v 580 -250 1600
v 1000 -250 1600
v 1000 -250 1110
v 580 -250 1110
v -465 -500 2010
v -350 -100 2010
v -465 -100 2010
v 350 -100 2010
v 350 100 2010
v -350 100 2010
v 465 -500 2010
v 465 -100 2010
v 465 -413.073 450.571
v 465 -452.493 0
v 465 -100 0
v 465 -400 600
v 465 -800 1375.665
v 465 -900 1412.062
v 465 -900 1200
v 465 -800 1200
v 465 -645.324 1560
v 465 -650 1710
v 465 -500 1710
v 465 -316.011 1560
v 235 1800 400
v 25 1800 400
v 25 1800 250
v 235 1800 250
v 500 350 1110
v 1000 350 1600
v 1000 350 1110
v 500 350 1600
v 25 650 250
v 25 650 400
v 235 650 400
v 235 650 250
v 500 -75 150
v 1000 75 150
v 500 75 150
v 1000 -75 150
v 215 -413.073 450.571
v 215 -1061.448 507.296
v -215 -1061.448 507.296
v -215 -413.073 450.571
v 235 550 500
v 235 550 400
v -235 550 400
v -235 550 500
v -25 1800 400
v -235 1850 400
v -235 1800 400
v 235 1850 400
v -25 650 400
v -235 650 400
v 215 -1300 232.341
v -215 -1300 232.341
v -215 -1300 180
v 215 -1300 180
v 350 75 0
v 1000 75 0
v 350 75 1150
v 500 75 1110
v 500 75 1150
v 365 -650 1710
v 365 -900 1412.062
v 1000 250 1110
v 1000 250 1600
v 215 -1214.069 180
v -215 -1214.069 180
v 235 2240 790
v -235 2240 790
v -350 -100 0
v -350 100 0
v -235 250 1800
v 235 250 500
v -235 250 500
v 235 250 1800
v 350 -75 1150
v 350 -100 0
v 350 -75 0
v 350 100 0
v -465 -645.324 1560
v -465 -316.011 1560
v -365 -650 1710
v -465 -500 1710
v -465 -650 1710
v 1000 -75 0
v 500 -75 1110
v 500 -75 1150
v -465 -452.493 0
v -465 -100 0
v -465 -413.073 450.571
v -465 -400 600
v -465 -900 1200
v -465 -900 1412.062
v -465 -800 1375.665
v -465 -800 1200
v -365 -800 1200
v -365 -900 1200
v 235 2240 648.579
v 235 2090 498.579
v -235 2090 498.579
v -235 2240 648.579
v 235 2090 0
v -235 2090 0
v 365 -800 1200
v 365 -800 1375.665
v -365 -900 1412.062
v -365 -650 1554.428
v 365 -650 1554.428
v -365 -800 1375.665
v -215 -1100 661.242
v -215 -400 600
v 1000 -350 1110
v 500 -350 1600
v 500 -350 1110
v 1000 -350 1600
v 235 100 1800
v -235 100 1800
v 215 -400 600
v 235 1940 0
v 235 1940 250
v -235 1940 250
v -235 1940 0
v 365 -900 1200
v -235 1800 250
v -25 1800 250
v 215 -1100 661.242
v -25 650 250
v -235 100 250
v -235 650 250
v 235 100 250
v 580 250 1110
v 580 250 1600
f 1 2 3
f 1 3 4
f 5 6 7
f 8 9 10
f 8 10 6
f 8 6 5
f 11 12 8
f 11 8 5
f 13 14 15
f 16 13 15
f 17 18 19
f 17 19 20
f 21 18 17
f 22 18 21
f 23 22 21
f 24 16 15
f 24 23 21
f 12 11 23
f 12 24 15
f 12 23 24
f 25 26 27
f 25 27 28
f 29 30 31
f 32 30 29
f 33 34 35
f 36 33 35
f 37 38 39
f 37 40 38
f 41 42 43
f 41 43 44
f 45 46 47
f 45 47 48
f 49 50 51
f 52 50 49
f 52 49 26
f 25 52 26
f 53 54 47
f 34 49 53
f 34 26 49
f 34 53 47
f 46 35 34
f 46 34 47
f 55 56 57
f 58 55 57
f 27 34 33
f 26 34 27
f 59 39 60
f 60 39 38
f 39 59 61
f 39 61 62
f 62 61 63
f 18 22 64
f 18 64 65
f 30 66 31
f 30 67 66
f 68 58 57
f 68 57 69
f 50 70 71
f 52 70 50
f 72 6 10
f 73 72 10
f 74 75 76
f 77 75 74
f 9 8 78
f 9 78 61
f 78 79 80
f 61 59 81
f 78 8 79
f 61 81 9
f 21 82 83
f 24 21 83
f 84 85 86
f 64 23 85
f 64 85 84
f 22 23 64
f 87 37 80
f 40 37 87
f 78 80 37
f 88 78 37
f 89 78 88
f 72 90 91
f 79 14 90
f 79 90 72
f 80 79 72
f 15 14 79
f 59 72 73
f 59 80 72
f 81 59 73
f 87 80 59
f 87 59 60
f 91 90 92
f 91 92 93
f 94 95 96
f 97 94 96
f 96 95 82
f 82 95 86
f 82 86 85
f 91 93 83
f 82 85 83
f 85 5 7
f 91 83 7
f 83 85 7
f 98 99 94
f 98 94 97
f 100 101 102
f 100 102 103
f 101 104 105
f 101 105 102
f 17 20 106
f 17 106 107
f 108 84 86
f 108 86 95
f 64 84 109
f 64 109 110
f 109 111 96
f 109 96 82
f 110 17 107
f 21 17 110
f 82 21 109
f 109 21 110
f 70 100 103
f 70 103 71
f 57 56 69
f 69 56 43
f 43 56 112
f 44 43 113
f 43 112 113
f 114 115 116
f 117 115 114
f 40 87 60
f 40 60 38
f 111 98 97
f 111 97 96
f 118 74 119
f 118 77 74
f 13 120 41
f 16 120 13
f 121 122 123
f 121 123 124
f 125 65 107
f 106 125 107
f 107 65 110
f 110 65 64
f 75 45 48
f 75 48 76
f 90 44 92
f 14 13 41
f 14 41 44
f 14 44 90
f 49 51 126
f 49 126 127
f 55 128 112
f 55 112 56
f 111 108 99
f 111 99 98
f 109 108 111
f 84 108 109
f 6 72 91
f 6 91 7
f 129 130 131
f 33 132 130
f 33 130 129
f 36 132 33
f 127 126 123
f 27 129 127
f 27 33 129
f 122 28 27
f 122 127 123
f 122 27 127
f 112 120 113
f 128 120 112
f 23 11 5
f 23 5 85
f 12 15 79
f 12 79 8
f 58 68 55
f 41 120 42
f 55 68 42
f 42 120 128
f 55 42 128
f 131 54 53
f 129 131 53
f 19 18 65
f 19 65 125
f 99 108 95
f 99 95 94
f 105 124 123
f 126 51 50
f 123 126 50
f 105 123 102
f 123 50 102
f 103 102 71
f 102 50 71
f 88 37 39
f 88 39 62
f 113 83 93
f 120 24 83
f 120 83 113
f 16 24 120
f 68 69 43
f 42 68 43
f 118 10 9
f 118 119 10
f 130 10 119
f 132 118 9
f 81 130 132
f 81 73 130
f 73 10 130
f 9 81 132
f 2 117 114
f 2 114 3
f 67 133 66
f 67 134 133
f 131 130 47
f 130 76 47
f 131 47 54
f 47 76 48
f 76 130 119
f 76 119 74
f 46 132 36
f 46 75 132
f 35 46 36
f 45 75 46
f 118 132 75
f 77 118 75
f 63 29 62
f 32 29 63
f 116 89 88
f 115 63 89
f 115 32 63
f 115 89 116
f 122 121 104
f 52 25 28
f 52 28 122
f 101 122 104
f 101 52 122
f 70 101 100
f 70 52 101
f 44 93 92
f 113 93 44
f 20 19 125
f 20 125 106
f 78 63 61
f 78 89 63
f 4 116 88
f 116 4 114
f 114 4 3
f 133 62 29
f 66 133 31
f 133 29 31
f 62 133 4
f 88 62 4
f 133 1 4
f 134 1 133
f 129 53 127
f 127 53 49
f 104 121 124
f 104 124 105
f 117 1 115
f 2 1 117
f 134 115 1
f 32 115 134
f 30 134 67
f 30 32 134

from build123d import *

# Parameters (mm, degrees)
F0_W           = 700
F0_H           = 200
F1_DEPTH       = 2010
F3_DEPTH       = 75
F6_DEPTH       = 465
F7_W           = 730
F7_H           = 250
F8_DEPTH       = 510
F10_DEPTH      = 235
F11_DEPTH      = 450
F11_DEPTH_BACK = 40
F12_W          = 250
F12_H          = 702.6738862803
F12_H_2        = 161.8577209214
F13_DEPTH      = 678.928617416
F14_W          = 210
F14_H          = 1150
F15_DEPTH      = 400.001


with BuildPart() as f1:
    # F0 (on Top) → F1 (new body)
    with BuildSketch(Plane.XY):
        Rectangle(F0_W, F0_H)
    extrude(amount=F1_DEPTH)

    # F2 (on Front) → F3 (join, symmetric)
    with BuildSketch(Plane.XZ):
        Polygon((500, 1150), (350, 1150), (350, 0), (1000, 0), (1000, 150), (500, 150), align=None)
    extrude(amount=F3_DEPTH, both=True)

    # F5 (on Right) → F6 (join, symmetric)
    with BuildSketch(Plane.YZ):
        Polygon((-100, 0), (-100, 2010), (-500, 2010), (-500, 1710), (-650, 1710), (-900, 1412.0616018514), (-900, 1200), (-800, 1200), (-800, 1375.6645784248), (-645.3242157434, 1560), (-316.0108830151, 1560), (-400, 600), (-1100, 661.2420644681), (-1300, 232.3406803662), (-1300, 180), (-1214.0690681916, 180), (-1061.4483185813, 507.2962537526), (-413.0733614121, 450.5707952862), (-452.4931981156, 0), align=None)
    extrude(amount=F6_DEPTH, both=True)

    # F7 (on face) → F8 (cut, through all)
    with BuildSketch(Plane.XY.offset(1710)):
        with Locations((0, -775)):
            Rectangle(F7_W, F7_H)
    extrude(amount=-F8_DEPTH, mode=Mode.SUBTRACT)

    # F9 (on Right) → F10 (join, symmetric)
    with BuildSketch(Plane.YZ):
        Polygon((100, 1800), (100, 250), (1940, 250), (1940, 0), (2090, 0), (2090, 498.5786437627), (2240, 648.5786437627), (2240, 790), (1850, 400), (550, 400), (550, 500), (250, 500), (250, 1800), align=None)
    extrude(amount=F10_DEPTH, both=True)

    # F4 (on face) → F11 (join, two sides)
    with BuildSketch(Plane.XY.offset(1150)) as f11_sk:
        Polygon((1000, 350), (500, 350), (500, 75), (500, 0), (500, -75), (500, -350), (1000, -350), (1000, -250), (580, -250), (580, 0), (580, 250), (1000, 250), align=None)
    extrude(amount=F11_DEPTH)
    extrude(f11_sk.sketch, amount=-F11_DEPTH_BACK)

    # F12 (on face) → F13 (cut, up to face)
    with BuildSketch(Plane(origin=(0, 49.0560039025, 560.7126903703), x_dir=(1, 0, 0), z_dir=(0, 0.0871557427, 0.9961946981))):
        with Locations((-340, -802.1082680255)):
            Rectangle(F12_W, F12_H)
        with Locations((-340, -1234.3740716264)):
            Rectangle(F12_W, F12_H_2)
        with Locations((340, -802.1082680255)):
            Rectangle(F12_W, F12_H)
        with Locations((340, -1234.3740716264)):
            Rectangle(F12_W, F12_H_2)
    extrude(amount=-F13_DEPTH, mode=Mode.SUBTRACT)

    # F14 (on face) → F15 (cut, through all)
    with BuildSketch(Plane.XY.offset(400)):
        with Locations((-130, 1225)):
            Rectangle(F14_W, F14_H)
        with Locations((130, 1225)):
            Rectangle(F14_W, F14_H)
    extrude(amount=-F15_DEPTH, mode=Mode.SUBTRACT)


solid = f1.part
